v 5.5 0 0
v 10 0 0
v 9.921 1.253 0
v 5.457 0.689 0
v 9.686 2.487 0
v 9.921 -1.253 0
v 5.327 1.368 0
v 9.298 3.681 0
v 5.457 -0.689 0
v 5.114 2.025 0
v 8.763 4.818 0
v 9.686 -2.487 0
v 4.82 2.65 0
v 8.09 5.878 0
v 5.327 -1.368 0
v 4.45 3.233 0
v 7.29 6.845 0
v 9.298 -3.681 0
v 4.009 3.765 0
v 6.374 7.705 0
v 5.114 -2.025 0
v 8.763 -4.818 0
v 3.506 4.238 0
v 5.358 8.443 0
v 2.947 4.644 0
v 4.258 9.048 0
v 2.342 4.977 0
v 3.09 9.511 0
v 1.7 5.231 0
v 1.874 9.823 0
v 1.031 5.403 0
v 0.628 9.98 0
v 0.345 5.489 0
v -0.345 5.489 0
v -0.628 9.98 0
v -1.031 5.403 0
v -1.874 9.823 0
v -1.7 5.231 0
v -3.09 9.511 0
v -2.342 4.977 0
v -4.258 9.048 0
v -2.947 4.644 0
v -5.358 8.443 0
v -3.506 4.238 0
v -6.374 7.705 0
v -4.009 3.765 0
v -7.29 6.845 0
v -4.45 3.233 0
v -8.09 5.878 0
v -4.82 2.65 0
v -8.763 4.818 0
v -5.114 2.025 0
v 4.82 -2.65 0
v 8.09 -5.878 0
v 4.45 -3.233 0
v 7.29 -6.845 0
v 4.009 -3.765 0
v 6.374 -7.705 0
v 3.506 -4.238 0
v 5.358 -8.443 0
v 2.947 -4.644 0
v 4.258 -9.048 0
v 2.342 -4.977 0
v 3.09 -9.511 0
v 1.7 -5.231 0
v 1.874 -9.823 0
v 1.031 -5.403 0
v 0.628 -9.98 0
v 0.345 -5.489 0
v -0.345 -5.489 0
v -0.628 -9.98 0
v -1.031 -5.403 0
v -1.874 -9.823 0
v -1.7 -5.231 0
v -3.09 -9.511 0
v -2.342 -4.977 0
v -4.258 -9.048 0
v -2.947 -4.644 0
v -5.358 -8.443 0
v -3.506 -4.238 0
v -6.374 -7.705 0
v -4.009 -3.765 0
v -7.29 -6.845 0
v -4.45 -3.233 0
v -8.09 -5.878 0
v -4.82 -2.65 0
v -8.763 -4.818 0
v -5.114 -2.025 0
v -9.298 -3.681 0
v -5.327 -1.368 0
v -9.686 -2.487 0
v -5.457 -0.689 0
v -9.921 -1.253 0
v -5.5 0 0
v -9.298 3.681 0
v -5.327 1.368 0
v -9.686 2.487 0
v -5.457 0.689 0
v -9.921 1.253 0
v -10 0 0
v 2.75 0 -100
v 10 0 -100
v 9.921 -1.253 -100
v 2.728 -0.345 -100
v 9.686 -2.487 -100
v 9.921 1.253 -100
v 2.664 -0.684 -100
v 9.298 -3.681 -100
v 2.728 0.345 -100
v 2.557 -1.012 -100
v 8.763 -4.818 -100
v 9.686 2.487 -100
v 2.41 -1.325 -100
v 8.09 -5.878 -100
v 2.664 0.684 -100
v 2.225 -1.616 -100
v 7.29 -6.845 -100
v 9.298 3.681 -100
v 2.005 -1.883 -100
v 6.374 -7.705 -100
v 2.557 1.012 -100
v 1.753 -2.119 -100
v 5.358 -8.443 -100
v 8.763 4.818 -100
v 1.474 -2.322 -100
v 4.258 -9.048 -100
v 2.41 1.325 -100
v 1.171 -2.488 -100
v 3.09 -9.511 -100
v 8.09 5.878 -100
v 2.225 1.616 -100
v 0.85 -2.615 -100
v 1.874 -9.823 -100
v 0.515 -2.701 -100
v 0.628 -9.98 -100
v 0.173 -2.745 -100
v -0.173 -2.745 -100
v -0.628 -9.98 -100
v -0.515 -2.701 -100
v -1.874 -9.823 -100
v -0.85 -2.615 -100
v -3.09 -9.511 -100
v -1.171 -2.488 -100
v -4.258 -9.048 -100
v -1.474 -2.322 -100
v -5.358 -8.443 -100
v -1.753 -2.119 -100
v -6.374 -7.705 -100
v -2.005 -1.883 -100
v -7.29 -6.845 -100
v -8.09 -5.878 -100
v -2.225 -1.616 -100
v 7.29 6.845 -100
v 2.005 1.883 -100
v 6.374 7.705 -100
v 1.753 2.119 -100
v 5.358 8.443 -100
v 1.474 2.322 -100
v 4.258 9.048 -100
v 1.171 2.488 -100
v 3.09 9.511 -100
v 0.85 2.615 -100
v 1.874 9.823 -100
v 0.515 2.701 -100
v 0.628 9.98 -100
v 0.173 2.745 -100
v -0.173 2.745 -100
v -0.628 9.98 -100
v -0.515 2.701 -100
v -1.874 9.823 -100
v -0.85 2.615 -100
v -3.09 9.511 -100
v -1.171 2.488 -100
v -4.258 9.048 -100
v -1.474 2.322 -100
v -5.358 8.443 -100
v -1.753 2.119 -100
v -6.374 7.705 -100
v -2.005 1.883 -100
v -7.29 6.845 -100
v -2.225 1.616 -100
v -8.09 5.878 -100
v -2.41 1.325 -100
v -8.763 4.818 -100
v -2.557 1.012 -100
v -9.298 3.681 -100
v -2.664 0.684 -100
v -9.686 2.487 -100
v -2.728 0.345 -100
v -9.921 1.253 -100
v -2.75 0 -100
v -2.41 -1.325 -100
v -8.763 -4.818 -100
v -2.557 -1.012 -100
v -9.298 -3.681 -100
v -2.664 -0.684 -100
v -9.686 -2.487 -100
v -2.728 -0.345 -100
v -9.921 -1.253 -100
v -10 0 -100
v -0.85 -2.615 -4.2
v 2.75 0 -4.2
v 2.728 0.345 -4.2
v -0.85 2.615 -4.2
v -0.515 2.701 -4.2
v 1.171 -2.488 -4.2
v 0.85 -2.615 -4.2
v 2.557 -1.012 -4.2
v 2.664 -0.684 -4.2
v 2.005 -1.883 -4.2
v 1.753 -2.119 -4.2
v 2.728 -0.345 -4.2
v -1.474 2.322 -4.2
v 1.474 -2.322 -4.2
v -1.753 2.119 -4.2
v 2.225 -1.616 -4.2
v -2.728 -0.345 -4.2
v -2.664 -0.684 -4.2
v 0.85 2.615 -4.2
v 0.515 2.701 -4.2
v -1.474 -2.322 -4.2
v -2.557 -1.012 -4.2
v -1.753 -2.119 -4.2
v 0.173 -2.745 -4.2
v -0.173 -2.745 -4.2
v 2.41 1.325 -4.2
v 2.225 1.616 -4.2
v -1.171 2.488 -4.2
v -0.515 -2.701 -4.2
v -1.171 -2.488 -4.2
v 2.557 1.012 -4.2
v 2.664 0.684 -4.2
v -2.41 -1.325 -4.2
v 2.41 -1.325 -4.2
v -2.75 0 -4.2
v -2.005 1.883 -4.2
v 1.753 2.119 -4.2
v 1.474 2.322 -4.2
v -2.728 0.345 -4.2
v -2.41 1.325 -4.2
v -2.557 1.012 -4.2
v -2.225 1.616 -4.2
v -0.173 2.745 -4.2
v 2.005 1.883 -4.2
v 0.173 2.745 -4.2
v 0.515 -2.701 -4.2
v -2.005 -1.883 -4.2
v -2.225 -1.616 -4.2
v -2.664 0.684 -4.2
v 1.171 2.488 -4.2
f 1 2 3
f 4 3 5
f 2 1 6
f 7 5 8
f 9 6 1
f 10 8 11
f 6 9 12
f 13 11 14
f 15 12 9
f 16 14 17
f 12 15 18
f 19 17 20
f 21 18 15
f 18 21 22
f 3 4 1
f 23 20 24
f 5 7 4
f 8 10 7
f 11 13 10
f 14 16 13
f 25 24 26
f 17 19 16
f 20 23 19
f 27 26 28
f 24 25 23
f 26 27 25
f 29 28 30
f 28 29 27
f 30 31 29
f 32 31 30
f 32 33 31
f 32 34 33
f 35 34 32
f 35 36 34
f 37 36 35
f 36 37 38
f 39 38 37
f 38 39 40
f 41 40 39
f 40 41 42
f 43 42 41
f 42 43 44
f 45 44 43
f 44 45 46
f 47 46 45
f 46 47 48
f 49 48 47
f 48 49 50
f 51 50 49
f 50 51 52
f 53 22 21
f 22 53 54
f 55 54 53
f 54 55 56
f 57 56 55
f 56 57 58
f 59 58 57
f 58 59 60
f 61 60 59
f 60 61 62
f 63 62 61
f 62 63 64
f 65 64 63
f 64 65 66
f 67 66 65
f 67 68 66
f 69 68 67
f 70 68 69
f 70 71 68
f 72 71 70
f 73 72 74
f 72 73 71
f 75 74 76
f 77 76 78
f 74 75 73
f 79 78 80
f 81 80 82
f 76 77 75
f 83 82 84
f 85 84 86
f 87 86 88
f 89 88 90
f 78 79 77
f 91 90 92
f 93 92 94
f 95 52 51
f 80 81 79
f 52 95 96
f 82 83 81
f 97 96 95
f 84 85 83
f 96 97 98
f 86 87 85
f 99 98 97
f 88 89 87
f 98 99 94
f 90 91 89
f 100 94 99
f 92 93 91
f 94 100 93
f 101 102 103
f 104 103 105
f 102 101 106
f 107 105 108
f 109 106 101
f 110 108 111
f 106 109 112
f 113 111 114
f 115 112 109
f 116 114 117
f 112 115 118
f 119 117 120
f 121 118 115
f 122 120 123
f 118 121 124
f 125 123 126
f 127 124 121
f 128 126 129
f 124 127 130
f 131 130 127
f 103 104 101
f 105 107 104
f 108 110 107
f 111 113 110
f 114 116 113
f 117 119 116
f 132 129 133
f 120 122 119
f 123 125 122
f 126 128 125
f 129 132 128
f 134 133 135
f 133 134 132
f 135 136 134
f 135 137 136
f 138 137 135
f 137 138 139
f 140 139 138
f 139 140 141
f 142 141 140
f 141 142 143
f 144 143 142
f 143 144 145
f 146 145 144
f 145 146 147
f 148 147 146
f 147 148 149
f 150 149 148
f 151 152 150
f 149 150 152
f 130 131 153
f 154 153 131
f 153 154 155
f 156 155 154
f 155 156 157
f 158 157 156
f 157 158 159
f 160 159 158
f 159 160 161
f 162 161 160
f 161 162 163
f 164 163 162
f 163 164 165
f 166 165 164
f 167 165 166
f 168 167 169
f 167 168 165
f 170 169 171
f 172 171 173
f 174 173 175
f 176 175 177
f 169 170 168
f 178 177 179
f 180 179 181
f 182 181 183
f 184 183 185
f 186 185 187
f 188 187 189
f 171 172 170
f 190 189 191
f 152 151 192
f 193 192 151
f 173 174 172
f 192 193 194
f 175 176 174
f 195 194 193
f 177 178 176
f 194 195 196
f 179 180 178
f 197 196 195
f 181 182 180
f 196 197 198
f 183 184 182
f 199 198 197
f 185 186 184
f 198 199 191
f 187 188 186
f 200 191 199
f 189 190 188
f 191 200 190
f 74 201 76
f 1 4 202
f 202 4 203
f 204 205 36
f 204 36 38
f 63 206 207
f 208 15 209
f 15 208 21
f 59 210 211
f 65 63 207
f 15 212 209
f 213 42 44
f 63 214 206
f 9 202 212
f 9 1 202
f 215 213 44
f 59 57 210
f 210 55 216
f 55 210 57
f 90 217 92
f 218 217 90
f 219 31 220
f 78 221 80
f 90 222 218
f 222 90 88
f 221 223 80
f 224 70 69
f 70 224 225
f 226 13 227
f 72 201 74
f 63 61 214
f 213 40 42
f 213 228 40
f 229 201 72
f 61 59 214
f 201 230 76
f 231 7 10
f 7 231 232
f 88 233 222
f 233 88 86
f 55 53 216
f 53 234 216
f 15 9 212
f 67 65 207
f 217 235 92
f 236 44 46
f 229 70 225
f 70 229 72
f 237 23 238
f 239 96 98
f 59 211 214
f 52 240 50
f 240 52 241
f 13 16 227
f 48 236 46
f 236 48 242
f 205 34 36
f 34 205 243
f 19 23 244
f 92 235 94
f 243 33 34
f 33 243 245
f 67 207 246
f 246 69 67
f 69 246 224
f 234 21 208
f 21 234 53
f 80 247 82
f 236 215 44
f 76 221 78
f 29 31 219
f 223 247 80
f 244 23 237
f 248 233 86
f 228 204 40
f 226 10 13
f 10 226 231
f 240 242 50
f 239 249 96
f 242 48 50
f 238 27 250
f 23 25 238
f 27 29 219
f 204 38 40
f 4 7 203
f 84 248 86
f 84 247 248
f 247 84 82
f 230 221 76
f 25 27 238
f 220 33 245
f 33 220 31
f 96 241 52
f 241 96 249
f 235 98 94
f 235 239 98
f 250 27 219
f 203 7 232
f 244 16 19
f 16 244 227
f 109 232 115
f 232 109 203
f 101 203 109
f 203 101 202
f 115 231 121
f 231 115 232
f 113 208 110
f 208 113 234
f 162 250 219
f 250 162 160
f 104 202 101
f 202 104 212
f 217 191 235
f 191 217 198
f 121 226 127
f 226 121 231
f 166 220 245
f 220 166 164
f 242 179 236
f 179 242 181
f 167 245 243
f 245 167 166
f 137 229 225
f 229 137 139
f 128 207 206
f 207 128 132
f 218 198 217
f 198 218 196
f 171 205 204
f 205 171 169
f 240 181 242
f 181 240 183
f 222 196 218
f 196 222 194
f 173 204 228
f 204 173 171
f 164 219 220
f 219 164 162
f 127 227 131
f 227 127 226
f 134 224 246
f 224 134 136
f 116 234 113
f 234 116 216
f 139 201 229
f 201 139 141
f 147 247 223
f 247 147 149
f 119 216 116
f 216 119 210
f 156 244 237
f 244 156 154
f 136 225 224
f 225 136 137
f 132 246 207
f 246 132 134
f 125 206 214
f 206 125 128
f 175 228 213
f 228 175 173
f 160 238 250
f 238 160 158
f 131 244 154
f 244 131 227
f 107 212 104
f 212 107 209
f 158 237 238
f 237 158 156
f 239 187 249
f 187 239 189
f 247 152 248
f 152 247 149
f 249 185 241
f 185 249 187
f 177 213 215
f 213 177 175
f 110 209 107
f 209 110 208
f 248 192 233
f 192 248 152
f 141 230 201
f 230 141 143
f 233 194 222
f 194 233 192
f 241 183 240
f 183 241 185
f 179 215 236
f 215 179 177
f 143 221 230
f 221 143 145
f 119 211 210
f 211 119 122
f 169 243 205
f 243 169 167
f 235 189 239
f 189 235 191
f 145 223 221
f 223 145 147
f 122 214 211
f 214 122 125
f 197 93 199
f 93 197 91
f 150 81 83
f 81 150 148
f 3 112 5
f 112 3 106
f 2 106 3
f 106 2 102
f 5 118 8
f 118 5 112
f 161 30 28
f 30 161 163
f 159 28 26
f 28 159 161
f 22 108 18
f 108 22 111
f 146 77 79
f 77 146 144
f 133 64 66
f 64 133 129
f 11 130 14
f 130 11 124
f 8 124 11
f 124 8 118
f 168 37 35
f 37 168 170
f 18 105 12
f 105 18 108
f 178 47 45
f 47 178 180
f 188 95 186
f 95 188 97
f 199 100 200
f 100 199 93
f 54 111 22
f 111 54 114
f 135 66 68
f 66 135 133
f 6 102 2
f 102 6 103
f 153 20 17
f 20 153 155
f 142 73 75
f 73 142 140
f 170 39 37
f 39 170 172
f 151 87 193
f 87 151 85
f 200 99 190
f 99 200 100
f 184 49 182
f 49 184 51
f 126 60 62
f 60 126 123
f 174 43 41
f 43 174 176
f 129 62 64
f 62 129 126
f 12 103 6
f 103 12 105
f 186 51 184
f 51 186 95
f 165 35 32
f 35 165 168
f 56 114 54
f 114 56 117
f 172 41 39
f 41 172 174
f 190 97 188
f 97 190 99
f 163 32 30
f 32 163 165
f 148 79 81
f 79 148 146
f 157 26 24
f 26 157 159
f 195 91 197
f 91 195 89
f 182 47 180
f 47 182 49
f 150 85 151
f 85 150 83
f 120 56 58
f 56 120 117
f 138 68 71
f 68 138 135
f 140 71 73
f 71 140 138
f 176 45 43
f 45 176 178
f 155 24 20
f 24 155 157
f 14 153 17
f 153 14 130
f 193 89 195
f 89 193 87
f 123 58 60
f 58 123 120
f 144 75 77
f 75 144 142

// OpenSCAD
$fn = 50;


difference() {
	union() {
		translate(v = [0, 0, -100.0000000000]) {
			cylinder(h = 100, r = 10.0000000000);
		}
		cylinder(h = 0, r = 19.0000000000);
	}
	union() {
		translate(v = [0, 0, 0]) {
			rotate(a = [0, 0, 0]) {
				difference() {
					union() {
						#translate(v = [0, 0, -100.0000000000]) {
							cylinder(h = 100, r = 2.2500000000);
						}
						#translate(v = [0, 0, -4.2000000000]) {
							cylinder(h = 4.2000000000, r1 = 2.7500000000, r2 = 5.5000000000);
						}
						#translate(v = [0, 0, -100.0000000000]) {
							cylinder(h = 100, r = 2.7500000000);
						}
						#translate(v = [0, 0, -100.0000000000]) {
							cylinder(h = 100, r = 2.2500000000);
						}
					}
					union();
				}
			}
		}
	}
}
